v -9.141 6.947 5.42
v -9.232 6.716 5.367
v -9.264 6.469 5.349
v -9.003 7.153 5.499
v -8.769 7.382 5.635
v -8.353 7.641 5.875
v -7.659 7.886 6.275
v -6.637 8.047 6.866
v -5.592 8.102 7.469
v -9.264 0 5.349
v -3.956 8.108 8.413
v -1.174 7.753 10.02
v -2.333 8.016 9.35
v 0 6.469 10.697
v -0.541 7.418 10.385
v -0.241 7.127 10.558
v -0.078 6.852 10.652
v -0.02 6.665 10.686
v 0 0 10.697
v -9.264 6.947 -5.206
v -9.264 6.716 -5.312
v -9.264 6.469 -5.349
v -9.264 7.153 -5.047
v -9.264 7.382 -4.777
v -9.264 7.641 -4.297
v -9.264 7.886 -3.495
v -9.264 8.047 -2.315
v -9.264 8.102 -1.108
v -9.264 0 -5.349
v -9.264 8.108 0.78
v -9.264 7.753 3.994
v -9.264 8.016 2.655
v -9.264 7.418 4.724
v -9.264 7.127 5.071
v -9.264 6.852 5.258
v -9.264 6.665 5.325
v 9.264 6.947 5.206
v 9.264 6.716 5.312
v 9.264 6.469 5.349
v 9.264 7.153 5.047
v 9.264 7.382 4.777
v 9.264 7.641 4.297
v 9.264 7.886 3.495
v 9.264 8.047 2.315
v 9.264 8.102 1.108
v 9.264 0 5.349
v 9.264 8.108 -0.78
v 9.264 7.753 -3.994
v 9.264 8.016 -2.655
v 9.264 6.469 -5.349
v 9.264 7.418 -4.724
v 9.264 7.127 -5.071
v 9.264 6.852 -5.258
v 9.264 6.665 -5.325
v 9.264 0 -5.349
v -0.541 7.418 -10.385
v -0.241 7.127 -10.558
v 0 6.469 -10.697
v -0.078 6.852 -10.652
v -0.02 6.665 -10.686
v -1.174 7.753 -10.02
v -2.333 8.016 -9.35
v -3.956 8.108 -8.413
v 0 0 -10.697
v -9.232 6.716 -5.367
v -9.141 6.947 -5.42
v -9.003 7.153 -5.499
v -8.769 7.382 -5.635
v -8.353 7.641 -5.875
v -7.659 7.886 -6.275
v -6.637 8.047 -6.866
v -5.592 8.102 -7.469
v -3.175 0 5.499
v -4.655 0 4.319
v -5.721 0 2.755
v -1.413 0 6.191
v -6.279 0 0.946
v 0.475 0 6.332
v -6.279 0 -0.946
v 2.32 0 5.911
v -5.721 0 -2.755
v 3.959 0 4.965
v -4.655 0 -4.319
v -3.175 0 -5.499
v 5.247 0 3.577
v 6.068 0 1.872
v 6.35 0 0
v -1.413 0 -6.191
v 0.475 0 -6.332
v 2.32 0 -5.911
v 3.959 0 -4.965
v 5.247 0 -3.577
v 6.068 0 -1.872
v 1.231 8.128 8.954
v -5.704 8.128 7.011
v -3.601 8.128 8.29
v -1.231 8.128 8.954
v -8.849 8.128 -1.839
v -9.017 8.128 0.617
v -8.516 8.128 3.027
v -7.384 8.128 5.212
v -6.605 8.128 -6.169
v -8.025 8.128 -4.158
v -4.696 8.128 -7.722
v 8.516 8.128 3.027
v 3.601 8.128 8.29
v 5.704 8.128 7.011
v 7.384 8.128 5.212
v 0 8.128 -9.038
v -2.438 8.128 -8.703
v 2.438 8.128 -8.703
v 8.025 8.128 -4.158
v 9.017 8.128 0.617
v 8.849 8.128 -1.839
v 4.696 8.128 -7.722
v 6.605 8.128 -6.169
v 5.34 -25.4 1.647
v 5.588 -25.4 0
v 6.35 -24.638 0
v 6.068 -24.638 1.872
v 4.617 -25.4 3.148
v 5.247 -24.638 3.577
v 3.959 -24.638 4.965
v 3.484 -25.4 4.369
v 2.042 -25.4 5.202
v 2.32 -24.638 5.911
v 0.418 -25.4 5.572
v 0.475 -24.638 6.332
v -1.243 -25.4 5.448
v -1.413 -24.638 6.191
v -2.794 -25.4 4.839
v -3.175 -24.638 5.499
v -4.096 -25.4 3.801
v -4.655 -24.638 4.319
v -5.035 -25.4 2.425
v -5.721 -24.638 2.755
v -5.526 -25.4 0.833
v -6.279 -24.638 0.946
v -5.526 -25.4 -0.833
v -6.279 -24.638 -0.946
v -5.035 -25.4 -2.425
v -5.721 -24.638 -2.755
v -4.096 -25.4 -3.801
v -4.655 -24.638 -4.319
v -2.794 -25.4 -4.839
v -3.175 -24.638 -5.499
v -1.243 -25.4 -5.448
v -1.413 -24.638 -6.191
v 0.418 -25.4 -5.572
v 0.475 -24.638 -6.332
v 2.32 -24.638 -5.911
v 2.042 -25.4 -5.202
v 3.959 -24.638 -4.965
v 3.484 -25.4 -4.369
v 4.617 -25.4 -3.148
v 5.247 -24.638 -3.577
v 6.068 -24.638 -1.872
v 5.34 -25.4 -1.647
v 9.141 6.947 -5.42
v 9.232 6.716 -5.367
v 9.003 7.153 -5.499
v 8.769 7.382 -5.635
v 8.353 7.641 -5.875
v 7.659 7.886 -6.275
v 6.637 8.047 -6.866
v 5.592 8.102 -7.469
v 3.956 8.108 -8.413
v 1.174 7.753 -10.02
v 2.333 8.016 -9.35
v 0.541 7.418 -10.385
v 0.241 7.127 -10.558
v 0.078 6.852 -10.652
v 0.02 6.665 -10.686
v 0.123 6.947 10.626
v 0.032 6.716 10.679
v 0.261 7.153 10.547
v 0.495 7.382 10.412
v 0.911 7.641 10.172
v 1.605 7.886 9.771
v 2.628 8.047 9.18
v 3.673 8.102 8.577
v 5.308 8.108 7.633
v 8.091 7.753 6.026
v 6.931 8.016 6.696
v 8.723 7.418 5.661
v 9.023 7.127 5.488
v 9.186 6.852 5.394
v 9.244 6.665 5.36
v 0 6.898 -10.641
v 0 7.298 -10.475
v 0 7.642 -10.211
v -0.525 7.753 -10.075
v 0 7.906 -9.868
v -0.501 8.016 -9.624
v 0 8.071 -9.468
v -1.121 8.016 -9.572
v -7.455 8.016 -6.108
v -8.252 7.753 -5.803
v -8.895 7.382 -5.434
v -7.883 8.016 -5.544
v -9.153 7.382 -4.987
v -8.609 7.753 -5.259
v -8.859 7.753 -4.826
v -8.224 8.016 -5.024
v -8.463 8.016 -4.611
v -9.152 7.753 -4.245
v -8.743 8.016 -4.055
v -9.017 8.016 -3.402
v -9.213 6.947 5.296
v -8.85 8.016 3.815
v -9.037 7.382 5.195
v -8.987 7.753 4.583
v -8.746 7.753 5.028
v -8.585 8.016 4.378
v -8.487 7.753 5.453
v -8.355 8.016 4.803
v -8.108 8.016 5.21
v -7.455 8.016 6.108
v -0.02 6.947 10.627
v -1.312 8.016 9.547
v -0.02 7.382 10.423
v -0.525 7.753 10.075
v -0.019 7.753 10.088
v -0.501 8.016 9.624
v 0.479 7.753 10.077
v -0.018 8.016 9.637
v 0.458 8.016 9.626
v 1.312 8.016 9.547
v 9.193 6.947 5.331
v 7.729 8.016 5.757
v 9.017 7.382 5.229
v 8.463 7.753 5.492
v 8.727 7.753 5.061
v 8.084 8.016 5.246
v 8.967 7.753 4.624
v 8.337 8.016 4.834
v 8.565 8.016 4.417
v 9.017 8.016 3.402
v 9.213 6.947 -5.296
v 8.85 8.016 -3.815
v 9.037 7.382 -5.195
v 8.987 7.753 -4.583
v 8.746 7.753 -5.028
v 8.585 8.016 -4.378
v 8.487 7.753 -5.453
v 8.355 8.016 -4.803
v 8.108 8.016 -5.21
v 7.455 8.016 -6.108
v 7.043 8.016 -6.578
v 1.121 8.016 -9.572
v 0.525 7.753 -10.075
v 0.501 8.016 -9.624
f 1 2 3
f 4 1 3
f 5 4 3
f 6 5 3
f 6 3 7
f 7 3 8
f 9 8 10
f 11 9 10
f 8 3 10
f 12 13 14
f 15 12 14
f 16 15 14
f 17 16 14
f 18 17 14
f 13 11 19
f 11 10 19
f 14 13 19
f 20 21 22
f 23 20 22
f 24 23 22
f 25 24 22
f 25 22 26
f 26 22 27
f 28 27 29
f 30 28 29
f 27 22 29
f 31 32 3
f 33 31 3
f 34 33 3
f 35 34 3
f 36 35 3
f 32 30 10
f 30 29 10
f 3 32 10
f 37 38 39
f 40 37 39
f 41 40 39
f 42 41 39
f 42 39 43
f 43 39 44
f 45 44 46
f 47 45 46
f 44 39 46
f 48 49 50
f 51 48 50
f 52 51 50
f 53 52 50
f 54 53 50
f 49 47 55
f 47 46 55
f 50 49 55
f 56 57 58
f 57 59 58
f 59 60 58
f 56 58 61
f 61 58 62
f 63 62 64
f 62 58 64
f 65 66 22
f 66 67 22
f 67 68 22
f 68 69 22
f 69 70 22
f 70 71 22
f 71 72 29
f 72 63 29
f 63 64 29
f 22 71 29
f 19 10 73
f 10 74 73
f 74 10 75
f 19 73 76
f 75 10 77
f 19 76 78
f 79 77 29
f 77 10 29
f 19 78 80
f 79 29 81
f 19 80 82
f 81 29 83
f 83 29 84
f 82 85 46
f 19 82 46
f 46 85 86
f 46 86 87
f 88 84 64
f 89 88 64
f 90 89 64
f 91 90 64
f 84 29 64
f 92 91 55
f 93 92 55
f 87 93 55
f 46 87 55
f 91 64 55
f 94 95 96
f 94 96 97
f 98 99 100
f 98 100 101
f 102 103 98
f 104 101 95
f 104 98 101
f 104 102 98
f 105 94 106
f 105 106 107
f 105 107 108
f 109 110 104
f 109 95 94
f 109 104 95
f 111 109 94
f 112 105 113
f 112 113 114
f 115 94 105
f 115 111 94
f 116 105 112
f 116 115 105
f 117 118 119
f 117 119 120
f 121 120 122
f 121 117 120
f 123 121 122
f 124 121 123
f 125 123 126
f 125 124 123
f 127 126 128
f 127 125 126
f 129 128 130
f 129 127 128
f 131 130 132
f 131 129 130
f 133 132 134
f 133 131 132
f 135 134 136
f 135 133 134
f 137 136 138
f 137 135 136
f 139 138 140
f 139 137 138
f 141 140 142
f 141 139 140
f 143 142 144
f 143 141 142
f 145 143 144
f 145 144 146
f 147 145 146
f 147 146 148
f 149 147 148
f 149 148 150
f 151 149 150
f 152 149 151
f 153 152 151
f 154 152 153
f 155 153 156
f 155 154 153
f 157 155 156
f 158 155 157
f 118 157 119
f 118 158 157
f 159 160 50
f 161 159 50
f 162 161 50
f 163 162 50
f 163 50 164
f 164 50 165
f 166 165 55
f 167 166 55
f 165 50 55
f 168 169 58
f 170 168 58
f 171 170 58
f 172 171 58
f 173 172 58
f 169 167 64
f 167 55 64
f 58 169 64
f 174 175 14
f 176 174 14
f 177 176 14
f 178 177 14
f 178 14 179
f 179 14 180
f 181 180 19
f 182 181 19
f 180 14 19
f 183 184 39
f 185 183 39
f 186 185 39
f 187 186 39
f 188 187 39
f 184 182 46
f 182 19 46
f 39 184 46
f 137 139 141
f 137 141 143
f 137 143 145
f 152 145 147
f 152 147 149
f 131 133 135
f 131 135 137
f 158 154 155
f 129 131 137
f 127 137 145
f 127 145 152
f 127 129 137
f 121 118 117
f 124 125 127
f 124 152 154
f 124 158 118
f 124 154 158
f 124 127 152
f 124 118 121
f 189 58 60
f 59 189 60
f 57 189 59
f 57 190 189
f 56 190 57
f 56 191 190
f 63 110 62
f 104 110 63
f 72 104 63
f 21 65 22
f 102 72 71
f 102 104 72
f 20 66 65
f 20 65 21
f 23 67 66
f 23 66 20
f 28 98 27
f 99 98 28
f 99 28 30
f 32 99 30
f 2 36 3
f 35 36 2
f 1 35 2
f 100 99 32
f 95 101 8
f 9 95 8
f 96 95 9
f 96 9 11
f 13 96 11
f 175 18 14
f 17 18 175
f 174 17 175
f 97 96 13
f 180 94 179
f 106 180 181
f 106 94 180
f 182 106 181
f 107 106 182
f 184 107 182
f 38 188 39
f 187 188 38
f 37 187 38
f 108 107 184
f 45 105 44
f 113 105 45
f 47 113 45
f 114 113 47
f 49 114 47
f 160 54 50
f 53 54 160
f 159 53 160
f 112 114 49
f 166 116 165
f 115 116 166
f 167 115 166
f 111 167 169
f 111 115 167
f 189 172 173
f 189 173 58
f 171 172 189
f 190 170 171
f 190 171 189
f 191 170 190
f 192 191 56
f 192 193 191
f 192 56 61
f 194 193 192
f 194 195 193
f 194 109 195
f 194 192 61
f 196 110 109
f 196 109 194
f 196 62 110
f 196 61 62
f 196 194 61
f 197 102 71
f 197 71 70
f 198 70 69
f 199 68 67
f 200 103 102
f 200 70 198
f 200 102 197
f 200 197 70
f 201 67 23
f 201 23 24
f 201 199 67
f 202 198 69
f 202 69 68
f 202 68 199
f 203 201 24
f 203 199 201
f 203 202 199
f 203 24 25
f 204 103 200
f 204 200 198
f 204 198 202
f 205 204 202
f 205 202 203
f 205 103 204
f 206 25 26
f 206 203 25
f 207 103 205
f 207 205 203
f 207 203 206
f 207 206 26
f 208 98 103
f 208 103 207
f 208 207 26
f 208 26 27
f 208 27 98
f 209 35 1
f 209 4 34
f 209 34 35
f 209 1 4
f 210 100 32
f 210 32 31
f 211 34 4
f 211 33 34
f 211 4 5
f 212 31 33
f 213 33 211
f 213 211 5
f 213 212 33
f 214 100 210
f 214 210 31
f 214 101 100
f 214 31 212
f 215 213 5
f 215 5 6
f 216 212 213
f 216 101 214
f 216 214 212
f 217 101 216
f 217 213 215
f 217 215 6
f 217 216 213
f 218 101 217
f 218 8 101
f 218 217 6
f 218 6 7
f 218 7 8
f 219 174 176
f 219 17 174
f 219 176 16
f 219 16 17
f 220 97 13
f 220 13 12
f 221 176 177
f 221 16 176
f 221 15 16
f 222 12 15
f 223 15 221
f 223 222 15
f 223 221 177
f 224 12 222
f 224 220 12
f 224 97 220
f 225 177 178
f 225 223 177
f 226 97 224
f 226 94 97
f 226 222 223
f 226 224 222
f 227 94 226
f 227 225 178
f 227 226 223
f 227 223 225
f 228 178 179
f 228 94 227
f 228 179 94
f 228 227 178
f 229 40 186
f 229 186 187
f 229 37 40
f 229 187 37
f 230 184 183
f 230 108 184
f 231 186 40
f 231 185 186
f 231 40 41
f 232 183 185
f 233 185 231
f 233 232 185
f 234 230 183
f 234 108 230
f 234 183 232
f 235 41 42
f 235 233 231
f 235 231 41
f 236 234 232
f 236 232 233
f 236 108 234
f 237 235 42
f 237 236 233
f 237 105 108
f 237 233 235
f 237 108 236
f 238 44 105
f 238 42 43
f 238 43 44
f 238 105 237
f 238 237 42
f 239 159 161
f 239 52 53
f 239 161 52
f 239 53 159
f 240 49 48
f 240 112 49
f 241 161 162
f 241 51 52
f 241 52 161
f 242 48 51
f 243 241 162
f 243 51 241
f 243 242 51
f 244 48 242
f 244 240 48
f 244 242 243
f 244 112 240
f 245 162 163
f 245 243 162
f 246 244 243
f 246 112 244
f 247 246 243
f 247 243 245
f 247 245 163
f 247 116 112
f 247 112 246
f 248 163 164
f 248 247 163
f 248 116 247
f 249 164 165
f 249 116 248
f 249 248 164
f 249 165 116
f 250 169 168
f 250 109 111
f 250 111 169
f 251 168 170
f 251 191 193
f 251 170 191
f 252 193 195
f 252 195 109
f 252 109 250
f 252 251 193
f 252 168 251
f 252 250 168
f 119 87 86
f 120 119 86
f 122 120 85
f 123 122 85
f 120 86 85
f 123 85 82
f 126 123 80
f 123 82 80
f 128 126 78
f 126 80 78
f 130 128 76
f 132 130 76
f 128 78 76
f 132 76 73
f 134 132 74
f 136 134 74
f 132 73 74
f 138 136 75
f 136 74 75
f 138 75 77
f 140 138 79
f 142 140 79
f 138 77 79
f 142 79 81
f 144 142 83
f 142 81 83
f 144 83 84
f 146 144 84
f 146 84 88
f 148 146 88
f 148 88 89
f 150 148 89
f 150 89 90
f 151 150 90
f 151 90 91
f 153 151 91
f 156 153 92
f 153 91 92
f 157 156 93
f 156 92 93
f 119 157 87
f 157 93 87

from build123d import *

# Parameters (mm, degrees)
EXTRUDE1_DEPTH = 8.128
SKETCH3_R      = 6.35
EXTRUDE2_DEPTH = 25.4
CHAMFER1_SIZE  = 0.762


with BuildPart() as part:
    # Sketch1 → Extrude1 (new body)
    with BuildSketch(Plane(origin=(0, 0, 0), x_dir=(1, 0, 0), z_dir=(0, 1, 0))):
        Polygon((0, 10.697481421), (-9.264290667, 5.34874071), (-9.264290667, -5.34874071), (0, -10.697481421), (9.264290667, -5.34874071), (9.264290667, 5.34874071), align=None)
    extrude(amount=EXTRUDE1_DEPTH)

    # Sketch3 → Extrude2 (add)
    with BuildSketch(Plane.XZ):
        Circle(SKETCH3_R)
    extrude(amount=EXTRUDE2_DEPTH)

    # Sketch2 → Cut-Revolve1 (revolve, cut)
    with BuildSketch(Plane(origin=(0, 0, 0), x_dir=(0, 0, -1), z_dir=(1, 0, 0))):
        with BuildLine():
            Line((9.038030353, 8.128), (10.697481421, 8.128))
            Line((10.697481421, 8.128), (10.697481421, 6.468548932))
            ThreePointArc((10.697481421, 6.468548932), (10.211439456, 7.641958035), (9.038030353, 8.128))
        make_face()
    revolve(axis=Axis((0, -25.4, 0), (0, 1, 0)), mode=Mode.SUBTRACT)

    # Chamfer1
    chamfer1_edges = [part.edges().sort_by_distance(p)[0] for p in [
        (-6.35, -25.4, 0),
    ]]
    chamfer(chamfer1_edges, length=CHAMFER1_SIZE)


solid = part.part
